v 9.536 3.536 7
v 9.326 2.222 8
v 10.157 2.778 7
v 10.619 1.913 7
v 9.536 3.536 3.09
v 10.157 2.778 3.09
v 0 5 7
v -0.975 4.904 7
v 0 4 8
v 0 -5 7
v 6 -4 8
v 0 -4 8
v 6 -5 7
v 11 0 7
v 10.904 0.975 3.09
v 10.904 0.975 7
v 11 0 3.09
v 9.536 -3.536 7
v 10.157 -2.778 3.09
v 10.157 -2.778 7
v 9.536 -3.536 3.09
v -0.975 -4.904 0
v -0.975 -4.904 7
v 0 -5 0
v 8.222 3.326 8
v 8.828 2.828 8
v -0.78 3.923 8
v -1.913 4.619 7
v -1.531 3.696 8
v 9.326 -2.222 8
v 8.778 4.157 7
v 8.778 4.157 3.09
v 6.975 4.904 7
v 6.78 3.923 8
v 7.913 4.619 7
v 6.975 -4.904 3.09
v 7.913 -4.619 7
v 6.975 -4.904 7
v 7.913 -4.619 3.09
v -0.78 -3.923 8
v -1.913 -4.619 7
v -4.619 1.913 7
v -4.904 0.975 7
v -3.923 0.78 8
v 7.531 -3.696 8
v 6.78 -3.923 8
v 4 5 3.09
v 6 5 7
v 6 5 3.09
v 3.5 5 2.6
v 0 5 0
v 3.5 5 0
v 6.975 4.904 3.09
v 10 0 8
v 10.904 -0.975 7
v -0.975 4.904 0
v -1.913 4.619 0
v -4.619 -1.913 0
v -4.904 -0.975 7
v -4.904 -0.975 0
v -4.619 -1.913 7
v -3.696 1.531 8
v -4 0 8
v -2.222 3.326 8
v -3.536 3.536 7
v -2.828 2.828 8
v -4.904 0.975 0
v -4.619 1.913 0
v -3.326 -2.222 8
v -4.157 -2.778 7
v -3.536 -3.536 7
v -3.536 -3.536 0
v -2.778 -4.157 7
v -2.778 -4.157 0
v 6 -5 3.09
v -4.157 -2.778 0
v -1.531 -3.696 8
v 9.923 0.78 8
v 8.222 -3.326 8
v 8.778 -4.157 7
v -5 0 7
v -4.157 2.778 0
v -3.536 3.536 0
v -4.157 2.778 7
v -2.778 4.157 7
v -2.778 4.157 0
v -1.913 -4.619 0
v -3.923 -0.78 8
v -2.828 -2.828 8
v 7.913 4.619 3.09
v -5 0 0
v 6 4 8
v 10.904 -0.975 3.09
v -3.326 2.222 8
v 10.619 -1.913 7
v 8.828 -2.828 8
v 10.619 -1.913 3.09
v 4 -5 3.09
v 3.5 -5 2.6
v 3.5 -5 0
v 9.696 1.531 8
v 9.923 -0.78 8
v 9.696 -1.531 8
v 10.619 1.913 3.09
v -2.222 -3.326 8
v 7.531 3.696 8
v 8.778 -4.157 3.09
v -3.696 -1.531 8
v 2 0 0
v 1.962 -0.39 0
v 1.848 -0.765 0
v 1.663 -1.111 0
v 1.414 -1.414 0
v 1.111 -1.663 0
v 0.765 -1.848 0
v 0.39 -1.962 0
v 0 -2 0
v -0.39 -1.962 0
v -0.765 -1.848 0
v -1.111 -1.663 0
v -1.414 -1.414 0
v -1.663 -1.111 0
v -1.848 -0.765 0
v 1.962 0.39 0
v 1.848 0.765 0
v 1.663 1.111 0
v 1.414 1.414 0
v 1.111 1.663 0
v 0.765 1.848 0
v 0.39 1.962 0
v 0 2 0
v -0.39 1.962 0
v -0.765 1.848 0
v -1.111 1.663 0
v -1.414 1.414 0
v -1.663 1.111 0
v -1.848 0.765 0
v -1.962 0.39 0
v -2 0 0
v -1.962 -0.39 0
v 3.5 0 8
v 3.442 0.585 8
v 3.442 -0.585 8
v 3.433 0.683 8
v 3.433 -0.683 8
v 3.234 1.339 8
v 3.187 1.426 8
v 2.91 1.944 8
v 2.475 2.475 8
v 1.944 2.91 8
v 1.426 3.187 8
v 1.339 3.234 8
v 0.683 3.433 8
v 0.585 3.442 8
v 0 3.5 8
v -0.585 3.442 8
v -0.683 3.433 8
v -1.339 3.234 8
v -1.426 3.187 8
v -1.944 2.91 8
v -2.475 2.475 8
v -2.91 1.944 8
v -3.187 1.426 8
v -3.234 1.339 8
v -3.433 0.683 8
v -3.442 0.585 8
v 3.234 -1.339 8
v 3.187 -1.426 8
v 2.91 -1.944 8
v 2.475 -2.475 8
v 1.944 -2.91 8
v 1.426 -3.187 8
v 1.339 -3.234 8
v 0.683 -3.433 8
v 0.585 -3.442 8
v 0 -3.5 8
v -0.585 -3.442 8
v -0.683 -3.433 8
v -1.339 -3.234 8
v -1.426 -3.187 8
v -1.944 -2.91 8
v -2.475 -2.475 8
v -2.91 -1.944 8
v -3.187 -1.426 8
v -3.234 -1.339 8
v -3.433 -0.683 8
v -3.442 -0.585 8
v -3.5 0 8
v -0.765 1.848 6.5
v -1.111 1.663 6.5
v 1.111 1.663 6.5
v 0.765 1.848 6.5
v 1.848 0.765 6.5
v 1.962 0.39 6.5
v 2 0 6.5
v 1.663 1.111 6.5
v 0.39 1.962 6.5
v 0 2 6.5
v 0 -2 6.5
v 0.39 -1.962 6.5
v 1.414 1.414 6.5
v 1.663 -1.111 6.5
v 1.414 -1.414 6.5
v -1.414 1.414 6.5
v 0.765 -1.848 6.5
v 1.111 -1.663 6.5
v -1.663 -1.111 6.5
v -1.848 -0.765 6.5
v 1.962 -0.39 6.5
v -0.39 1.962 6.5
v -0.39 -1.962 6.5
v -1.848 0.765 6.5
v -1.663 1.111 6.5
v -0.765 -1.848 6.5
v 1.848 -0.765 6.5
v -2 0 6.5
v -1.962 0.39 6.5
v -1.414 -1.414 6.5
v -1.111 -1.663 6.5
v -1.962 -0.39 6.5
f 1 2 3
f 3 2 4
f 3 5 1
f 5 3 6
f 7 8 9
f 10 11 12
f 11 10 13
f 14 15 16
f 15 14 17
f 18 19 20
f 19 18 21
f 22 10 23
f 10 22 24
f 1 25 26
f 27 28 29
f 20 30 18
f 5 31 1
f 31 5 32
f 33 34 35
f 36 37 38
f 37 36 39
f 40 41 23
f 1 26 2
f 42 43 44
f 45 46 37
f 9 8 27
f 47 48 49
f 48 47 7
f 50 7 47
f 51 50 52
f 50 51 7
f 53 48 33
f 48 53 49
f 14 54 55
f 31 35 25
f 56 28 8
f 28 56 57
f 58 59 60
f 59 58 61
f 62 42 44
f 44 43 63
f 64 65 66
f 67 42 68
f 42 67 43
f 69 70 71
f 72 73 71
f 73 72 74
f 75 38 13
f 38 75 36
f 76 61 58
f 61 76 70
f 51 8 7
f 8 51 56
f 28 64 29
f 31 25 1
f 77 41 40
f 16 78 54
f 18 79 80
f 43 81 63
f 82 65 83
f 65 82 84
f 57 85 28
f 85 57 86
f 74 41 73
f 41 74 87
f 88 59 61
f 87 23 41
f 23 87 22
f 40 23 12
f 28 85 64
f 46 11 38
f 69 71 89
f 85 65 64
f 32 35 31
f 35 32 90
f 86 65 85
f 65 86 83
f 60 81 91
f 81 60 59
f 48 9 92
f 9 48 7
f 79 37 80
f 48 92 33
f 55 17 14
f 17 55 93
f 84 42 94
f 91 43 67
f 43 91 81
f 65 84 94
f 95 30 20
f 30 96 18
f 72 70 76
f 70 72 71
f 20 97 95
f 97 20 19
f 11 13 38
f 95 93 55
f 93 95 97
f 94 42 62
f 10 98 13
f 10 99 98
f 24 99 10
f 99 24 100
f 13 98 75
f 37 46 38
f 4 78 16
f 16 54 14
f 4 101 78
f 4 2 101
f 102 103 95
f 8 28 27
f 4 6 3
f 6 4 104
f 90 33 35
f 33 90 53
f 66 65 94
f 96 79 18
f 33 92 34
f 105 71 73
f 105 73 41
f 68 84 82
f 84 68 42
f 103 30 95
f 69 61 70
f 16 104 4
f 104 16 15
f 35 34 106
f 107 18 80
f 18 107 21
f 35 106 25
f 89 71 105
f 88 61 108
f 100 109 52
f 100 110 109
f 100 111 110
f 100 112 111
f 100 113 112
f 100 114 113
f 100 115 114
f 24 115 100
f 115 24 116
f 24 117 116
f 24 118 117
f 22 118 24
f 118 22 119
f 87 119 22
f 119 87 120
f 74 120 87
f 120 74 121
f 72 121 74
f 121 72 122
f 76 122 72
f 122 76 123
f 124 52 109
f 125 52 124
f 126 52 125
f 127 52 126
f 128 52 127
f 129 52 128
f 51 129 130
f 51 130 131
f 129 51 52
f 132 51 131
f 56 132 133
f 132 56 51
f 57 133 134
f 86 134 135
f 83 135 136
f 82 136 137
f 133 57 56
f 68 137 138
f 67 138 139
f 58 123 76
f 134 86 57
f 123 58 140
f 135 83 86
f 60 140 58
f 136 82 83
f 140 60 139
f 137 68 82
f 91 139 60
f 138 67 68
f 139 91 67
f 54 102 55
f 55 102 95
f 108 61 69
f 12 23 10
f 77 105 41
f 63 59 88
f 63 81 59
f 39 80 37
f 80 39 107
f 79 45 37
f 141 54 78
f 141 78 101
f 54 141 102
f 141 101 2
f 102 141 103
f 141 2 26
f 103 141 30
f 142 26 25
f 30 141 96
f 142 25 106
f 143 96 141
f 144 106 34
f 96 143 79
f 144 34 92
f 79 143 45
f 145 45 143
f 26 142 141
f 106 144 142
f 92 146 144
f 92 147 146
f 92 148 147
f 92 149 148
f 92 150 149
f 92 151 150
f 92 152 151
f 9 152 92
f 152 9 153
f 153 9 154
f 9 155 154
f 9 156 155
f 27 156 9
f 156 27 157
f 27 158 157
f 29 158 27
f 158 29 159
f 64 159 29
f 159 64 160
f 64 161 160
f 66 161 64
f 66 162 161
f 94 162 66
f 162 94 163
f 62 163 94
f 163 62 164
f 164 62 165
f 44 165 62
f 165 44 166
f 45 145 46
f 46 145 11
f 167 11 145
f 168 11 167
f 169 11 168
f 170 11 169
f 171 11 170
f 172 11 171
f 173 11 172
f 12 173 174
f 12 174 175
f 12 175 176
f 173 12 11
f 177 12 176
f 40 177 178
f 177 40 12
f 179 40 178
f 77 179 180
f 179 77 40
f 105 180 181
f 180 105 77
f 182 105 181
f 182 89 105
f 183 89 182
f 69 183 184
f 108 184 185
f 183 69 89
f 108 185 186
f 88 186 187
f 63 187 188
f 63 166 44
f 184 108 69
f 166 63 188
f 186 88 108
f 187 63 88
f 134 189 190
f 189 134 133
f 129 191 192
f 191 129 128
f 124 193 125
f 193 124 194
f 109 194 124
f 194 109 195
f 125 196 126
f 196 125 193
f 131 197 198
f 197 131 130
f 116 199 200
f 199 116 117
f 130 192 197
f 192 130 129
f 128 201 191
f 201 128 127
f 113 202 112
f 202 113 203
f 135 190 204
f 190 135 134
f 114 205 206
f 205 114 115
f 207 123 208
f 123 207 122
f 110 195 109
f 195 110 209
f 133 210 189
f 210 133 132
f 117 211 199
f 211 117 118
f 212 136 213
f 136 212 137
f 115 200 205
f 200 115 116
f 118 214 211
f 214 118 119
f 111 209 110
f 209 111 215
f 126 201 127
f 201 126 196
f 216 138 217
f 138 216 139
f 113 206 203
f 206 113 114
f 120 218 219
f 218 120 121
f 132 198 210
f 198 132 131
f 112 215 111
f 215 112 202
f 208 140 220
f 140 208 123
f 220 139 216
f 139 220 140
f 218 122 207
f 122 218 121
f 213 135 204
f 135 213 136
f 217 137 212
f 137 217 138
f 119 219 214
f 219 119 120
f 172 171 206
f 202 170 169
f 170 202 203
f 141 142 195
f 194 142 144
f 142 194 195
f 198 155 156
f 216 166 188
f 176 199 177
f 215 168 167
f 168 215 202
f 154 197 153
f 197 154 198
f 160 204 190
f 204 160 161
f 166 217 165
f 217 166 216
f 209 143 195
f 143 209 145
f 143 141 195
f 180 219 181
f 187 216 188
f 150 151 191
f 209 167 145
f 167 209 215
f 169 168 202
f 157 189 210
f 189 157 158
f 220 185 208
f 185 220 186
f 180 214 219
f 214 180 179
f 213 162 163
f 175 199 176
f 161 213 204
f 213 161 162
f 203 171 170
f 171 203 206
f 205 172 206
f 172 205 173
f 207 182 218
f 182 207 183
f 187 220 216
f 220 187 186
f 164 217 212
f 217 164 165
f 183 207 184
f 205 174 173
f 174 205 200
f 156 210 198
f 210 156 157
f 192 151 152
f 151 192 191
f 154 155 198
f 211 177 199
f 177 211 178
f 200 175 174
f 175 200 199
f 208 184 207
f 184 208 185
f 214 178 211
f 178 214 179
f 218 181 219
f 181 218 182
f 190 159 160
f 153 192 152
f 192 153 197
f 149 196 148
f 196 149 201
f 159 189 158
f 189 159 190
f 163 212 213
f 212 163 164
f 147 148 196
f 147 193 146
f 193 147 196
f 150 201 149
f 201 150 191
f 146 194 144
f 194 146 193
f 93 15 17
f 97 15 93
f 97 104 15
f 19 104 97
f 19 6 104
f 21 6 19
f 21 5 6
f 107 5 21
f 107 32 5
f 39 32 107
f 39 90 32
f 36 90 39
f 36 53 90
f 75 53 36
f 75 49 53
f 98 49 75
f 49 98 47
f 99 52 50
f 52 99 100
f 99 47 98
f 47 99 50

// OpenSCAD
$fn=32;
h=8;
mirror_thickness = 3.1;
difference(){
    hull(){
        cylinder(h=h-1,d=10);
        cylinder(h=h,d=8);
        translate([6,0])
        {
            cylinder(h=h-1,d=10);
            cylinder(h=h,d=8);
        }
    }
    cylinder(d=4,h=100,center=true);
    translate([0,0,h-1.5])
        cylinder(d1=4,d2=8,h=2);
    hull() {
        translate([4,-10,-0.01])
            cube([20,20,mirror_thickness]);
        
        translate([4-0.5,-10,-0.5])
            cube([20,20,mirror_thickness]);
    }
}
